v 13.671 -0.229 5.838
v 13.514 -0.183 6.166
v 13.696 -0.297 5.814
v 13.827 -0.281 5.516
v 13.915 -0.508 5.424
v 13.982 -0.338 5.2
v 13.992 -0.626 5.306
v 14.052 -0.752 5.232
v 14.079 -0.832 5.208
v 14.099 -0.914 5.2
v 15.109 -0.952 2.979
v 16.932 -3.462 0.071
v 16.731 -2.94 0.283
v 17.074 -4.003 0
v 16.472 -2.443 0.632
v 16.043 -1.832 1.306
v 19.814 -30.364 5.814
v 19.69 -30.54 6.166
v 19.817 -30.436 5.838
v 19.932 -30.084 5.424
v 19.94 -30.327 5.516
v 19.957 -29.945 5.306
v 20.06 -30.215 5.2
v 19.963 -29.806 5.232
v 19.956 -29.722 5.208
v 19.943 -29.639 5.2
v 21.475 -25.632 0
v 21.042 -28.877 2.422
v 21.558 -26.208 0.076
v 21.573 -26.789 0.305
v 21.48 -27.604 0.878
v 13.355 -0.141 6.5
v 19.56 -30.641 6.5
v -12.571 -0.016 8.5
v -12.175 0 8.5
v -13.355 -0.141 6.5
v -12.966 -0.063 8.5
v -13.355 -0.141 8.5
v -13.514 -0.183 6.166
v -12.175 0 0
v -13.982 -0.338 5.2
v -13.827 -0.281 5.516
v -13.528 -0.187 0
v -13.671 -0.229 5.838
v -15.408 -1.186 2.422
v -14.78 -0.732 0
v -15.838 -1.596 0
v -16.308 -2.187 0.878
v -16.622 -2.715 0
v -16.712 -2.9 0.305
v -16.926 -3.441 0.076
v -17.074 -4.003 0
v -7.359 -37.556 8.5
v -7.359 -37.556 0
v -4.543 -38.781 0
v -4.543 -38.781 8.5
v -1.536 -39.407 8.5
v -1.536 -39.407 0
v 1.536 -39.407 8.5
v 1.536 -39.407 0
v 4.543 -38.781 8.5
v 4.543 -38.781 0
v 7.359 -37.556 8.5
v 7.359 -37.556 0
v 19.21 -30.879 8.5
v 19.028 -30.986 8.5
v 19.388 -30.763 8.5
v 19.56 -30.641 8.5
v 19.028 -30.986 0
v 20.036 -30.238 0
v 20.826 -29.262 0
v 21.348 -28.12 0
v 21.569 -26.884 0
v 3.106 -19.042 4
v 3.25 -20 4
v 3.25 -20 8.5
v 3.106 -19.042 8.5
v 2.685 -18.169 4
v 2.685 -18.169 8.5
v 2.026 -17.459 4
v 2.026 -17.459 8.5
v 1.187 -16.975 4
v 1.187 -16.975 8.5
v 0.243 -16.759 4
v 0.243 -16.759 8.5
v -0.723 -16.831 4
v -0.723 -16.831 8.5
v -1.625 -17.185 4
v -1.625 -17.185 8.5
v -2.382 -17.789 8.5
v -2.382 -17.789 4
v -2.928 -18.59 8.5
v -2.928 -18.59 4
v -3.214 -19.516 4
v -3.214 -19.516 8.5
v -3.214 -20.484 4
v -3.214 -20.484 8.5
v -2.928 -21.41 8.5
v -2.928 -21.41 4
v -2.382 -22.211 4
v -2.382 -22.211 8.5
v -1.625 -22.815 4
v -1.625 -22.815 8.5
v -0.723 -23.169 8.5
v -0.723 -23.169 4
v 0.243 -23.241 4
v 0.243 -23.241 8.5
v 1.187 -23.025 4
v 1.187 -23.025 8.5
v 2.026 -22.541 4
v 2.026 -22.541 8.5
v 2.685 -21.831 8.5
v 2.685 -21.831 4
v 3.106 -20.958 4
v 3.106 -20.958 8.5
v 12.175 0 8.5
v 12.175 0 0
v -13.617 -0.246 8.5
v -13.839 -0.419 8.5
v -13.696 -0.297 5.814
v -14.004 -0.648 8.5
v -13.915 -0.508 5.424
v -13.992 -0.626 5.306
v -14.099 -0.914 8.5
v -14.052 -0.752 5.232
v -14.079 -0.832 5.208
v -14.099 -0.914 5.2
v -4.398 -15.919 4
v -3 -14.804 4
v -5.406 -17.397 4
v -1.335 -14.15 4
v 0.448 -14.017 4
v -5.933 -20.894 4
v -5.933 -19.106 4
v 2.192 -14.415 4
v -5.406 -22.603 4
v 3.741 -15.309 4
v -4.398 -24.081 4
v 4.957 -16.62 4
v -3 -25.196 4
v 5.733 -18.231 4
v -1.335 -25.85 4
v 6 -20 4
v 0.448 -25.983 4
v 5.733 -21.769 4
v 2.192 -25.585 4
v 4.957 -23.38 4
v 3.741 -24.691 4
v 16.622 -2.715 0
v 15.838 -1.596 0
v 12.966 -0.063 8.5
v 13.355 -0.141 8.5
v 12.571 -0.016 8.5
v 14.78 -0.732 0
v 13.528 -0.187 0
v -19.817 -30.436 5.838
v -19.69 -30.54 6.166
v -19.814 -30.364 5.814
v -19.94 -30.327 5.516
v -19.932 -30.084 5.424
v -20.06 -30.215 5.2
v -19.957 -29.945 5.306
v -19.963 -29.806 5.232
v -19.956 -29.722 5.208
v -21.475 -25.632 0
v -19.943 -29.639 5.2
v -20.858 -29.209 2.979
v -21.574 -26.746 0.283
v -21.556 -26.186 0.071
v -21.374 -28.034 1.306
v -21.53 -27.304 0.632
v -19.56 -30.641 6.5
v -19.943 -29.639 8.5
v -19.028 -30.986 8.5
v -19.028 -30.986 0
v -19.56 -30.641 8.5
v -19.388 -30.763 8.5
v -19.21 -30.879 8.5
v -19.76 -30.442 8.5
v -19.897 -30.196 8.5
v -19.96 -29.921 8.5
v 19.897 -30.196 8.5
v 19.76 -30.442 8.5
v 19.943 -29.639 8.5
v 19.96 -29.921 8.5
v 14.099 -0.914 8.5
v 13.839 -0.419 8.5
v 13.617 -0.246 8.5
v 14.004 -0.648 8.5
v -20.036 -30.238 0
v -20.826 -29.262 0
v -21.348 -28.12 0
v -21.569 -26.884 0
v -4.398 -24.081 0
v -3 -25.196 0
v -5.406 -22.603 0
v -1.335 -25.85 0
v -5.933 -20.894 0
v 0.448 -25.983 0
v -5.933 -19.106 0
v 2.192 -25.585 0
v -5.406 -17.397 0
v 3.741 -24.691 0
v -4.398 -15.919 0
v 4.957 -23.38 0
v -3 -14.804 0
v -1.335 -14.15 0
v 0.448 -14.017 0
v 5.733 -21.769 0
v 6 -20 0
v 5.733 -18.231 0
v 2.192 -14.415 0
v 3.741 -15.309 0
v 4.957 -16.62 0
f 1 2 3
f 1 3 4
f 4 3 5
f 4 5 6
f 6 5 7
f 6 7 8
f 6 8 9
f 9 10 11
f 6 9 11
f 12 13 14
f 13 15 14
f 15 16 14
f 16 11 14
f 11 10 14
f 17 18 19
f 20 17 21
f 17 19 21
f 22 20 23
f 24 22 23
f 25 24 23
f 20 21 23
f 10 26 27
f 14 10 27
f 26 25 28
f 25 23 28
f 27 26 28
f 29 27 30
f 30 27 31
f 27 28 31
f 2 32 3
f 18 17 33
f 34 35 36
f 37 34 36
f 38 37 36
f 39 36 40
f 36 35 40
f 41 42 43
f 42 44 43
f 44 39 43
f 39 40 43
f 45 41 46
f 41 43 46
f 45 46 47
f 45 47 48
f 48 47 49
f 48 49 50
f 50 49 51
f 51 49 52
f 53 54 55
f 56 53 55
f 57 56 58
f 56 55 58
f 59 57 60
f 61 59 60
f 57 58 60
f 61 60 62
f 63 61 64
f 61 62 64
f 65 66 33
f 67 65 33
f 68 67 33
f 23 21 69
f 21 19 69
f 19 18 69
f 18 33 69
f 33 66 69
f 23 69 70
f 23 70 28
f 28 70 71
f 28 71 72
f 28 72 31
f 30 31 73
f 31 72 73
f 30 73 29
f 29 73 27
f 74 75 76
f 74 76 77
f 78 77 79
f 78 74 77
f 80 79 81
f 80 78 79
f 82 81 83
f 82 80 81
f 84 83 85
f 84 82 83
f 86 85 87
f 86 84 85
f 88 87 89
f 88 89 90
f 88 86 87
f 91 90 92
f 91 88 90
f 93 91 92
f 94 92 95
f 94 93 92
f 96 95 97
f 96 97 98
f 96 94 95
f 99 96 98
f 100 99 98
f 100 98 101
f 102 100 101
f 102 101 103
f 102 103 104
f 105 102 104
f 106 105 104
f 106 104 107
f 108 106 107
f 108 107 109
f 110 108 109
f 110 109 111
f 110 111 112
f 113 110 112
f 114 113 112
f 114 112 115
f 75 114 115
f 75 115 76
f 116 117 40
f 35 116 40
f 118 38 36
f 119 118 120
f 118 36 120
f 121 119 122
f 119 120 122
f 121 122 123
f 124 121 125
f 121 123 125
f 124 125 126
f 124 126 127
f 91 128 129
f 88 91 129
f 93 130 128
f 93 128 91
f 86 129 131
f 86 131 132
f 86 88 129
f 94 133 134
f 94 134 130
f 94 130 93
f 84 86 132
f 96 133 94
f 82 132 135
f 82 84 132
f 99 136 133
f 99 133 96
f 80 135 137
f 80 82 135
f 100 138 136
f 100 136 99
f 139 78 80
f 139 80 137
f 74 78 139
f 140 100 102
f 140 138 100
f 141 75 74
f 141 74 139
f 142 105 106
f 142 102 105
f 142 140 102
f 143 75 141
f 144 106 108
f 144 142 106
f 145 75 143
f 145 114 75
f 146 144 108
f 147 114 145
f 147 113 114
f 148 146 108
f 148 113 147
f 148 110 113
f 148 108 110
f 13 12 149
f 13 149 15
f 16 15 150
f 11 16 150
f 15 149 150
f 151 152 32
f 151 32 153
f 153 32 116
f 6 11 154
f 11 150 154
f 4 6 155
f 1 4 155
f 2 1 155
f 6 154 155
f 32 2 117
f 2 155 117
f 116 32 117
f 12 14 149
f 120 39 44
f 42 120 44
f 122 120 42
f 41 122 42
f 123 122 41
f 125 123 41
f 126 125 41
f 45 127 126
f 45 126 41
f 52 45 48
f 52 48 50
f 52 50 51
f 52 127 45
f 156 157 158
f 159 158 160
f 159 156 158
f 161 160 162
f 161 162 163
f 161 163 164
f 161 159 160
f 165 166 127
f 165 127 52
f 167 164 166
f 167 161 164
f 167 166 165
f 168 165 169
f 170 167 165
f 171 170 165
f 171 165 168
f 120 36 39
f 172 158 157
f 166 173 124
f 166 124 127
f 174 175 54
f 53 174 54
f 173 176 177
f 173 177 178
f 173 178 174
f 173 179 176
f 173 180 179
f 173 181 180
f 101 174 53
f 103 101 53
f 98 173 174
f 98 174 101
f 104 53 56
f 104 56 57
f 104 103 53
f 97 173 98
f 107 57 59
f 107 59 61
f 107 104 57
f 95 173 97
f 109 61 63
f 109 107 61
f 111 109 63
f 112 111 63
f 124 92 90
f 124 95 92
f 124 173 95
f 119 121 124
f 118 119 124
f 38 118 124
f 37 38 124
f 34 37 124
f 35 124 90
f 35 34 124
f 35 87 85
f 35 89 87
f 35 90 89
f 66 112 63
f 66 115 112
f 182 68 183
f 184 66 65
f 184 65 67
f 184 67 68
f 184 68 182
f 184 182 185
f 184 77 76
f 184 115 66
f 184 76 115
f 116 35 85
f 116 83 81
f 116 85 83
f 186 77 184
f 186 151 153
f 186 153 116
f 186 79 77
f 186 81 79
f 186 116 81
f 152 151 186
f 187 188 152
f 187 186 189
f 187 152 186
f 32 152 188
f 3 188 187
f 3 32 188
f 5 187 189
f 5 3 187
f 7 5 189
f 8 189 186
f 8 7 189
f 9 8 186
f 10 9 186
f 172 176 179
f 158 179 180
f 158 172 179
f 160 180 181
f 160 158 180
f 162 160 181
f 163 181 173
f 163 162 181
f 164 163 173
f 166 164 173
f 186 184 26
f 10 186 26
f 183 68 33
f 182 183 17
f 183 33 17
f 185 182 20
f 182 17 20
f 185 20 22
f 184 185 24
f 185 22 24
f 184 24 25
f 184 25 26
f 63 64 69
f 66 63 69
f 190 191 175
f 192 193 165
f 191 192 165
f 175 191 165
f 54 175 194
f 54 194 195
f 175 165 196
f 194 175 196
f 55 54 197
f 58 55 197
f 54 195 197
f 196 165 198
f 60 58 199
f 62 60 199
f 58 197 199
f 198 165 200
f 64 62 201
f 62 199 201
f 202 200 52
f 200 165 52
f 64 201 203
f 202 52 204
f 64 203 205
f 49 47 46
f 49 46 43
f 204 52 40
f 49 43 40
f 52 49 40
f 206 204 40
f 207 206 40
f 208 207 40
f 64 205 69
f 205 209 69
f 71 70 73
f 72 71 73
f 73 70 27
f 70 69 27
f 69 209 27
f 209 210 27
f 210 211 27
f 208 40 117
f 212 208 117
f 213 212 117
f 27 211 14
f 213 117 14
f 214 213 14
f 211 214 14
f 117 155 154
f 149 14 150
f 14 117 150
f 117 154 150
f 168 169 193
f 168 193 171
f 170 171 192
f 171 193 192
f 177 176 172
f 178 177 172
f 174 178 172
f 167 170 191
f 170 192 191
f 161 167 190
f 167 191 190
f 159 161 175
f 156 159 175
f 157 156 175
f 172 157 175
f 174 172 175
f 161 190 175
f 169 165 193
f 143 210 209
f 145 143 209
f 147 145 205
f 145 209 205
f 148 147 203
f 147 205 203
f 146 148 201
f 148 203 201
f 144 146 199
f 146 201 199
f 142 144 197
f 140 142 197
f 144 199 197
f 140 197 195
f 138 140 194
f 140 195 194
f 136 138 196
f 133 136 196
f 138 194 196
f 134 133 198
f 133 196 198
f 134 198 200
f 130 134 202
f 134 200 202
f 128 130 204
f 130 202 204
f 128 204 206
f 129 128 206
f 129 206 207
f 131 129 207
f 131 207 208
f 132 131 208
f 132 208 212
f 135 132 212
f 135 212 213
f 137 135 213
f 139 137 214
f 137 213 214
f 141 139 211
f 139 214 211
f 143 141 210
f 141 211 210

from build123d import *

# Parameters (mm, degrees)
F0_R     = 3.25
F1_DEPTH = 8.5
F2_R     = 6
F2_R_2   = 3.25
F3_DEPTH = 4
F7_DEPTH = 48.701737703
F8_R     = 1


# Not quite as in the source:
# - a pattern or mirror of a feature is missing from the dataset's text; its kind, count and spacing are read off the source's solid


with BuildPart() as f1:
    # F0 (on Top) → F1 (new body)
    with BuildSketch(Plane.XY):
        with BuildLine():
            Line((21.4749827509, -25.6324591351), (17.0744521737, -4.0031603279))
            ThreePointArc((17.0744521737, -4.0031603279), (15.3383552934, -1.1280367796), (12.1748286506, 0))
            Line((12.1748286506, 0), (0, 0))
            Line((0, 0), (-12.1748286506, 0))
            ThreePointArc((-12.1748286506, 0), (-15.3383552934, -1.1280367796), (-17.0744521737, -4.0031603279))
            Line((-17.0744521737, -4.0031603279), (-21.4749827509, -25.6324591351))
            ThreePointArc((-21.4749827509, -25.6324591351), (-21.1230164973, -28.7074742953), (-19.0284610173, -30.9861659857))
            Line((-19.0284610173, -30.9861659857), (-7.3593053684, -37.5563976295))
            ThreePointArc((-7.3593053684, -37.5563976295), (0, -39.4857960942), (7.3593053684, -37.5563976295))
            Line((7.3593053684, -37.5563976295), (19.0284610173, -30.9861659857))
            ThreePointArc((19.0284610173, -30.9861659857), (21.1230164973, -28.7074742953), (21.4749827509, -25.6324591351))
        make_face()
        with Locations((0, -20)):
            Circle(F0_R, mode=Mode.SUBTRACT)
    extrude(amount=F1_DEPTH)

    # F2 (on face) → F3 (cut)
    with BuildSketch(Plane(origin=(0, 0, 0), x_dir=(1, 0, 0), z_dir=(0, 0, -1))):
        with Locations((0, 20)):
            Circle(F2_R)
        with Locations((0, 20)):
            Circle(F2_R_2, mode=Mode.SUBTRACT)
    extrude(amount=-F3_DEPTH, mode=Mode.SUBTRACT)

    # F6 (on face) → F7 (cut, through all)
    with BuildSketch(Plane(origin=(-8.8517973086, -43.5079737791, 0), x_dir=(-0.9799247046, 0.1993679344, 0), z_dir=(0.1993679344, 0.9799247046, 0))):
        Polygon((15.9335756971, 0), (15.9335756971, 8.5), (13.6335756971, 8.5), (13.6335756971, 5.2), align=None)
    f7 = extrude(amount=F7_DEPTH, mode=Mode.SUBTRACT)

    # F7_copies: F7 across plane
    add(f7.mirror(Plane(origin=(0, 0, 0), x_dir=(0, 0, 1), z_dir=(1, 0, 0))), mode=Mode.SUBTRACT)

    # F8
    f8_edges = [f1.edges().sort_by_distance(p)[0] for p in [
        (-20.060161, -30.214847, 6.85),
        (-13.98162, -0.337865, 6.85),
        (20.060161, -30.214847, 6.85),
        (13.98162, -0.337865, 6.85),
    ]]
    fillet(f8_edges, radius=F8_R)


solid = f1.part
